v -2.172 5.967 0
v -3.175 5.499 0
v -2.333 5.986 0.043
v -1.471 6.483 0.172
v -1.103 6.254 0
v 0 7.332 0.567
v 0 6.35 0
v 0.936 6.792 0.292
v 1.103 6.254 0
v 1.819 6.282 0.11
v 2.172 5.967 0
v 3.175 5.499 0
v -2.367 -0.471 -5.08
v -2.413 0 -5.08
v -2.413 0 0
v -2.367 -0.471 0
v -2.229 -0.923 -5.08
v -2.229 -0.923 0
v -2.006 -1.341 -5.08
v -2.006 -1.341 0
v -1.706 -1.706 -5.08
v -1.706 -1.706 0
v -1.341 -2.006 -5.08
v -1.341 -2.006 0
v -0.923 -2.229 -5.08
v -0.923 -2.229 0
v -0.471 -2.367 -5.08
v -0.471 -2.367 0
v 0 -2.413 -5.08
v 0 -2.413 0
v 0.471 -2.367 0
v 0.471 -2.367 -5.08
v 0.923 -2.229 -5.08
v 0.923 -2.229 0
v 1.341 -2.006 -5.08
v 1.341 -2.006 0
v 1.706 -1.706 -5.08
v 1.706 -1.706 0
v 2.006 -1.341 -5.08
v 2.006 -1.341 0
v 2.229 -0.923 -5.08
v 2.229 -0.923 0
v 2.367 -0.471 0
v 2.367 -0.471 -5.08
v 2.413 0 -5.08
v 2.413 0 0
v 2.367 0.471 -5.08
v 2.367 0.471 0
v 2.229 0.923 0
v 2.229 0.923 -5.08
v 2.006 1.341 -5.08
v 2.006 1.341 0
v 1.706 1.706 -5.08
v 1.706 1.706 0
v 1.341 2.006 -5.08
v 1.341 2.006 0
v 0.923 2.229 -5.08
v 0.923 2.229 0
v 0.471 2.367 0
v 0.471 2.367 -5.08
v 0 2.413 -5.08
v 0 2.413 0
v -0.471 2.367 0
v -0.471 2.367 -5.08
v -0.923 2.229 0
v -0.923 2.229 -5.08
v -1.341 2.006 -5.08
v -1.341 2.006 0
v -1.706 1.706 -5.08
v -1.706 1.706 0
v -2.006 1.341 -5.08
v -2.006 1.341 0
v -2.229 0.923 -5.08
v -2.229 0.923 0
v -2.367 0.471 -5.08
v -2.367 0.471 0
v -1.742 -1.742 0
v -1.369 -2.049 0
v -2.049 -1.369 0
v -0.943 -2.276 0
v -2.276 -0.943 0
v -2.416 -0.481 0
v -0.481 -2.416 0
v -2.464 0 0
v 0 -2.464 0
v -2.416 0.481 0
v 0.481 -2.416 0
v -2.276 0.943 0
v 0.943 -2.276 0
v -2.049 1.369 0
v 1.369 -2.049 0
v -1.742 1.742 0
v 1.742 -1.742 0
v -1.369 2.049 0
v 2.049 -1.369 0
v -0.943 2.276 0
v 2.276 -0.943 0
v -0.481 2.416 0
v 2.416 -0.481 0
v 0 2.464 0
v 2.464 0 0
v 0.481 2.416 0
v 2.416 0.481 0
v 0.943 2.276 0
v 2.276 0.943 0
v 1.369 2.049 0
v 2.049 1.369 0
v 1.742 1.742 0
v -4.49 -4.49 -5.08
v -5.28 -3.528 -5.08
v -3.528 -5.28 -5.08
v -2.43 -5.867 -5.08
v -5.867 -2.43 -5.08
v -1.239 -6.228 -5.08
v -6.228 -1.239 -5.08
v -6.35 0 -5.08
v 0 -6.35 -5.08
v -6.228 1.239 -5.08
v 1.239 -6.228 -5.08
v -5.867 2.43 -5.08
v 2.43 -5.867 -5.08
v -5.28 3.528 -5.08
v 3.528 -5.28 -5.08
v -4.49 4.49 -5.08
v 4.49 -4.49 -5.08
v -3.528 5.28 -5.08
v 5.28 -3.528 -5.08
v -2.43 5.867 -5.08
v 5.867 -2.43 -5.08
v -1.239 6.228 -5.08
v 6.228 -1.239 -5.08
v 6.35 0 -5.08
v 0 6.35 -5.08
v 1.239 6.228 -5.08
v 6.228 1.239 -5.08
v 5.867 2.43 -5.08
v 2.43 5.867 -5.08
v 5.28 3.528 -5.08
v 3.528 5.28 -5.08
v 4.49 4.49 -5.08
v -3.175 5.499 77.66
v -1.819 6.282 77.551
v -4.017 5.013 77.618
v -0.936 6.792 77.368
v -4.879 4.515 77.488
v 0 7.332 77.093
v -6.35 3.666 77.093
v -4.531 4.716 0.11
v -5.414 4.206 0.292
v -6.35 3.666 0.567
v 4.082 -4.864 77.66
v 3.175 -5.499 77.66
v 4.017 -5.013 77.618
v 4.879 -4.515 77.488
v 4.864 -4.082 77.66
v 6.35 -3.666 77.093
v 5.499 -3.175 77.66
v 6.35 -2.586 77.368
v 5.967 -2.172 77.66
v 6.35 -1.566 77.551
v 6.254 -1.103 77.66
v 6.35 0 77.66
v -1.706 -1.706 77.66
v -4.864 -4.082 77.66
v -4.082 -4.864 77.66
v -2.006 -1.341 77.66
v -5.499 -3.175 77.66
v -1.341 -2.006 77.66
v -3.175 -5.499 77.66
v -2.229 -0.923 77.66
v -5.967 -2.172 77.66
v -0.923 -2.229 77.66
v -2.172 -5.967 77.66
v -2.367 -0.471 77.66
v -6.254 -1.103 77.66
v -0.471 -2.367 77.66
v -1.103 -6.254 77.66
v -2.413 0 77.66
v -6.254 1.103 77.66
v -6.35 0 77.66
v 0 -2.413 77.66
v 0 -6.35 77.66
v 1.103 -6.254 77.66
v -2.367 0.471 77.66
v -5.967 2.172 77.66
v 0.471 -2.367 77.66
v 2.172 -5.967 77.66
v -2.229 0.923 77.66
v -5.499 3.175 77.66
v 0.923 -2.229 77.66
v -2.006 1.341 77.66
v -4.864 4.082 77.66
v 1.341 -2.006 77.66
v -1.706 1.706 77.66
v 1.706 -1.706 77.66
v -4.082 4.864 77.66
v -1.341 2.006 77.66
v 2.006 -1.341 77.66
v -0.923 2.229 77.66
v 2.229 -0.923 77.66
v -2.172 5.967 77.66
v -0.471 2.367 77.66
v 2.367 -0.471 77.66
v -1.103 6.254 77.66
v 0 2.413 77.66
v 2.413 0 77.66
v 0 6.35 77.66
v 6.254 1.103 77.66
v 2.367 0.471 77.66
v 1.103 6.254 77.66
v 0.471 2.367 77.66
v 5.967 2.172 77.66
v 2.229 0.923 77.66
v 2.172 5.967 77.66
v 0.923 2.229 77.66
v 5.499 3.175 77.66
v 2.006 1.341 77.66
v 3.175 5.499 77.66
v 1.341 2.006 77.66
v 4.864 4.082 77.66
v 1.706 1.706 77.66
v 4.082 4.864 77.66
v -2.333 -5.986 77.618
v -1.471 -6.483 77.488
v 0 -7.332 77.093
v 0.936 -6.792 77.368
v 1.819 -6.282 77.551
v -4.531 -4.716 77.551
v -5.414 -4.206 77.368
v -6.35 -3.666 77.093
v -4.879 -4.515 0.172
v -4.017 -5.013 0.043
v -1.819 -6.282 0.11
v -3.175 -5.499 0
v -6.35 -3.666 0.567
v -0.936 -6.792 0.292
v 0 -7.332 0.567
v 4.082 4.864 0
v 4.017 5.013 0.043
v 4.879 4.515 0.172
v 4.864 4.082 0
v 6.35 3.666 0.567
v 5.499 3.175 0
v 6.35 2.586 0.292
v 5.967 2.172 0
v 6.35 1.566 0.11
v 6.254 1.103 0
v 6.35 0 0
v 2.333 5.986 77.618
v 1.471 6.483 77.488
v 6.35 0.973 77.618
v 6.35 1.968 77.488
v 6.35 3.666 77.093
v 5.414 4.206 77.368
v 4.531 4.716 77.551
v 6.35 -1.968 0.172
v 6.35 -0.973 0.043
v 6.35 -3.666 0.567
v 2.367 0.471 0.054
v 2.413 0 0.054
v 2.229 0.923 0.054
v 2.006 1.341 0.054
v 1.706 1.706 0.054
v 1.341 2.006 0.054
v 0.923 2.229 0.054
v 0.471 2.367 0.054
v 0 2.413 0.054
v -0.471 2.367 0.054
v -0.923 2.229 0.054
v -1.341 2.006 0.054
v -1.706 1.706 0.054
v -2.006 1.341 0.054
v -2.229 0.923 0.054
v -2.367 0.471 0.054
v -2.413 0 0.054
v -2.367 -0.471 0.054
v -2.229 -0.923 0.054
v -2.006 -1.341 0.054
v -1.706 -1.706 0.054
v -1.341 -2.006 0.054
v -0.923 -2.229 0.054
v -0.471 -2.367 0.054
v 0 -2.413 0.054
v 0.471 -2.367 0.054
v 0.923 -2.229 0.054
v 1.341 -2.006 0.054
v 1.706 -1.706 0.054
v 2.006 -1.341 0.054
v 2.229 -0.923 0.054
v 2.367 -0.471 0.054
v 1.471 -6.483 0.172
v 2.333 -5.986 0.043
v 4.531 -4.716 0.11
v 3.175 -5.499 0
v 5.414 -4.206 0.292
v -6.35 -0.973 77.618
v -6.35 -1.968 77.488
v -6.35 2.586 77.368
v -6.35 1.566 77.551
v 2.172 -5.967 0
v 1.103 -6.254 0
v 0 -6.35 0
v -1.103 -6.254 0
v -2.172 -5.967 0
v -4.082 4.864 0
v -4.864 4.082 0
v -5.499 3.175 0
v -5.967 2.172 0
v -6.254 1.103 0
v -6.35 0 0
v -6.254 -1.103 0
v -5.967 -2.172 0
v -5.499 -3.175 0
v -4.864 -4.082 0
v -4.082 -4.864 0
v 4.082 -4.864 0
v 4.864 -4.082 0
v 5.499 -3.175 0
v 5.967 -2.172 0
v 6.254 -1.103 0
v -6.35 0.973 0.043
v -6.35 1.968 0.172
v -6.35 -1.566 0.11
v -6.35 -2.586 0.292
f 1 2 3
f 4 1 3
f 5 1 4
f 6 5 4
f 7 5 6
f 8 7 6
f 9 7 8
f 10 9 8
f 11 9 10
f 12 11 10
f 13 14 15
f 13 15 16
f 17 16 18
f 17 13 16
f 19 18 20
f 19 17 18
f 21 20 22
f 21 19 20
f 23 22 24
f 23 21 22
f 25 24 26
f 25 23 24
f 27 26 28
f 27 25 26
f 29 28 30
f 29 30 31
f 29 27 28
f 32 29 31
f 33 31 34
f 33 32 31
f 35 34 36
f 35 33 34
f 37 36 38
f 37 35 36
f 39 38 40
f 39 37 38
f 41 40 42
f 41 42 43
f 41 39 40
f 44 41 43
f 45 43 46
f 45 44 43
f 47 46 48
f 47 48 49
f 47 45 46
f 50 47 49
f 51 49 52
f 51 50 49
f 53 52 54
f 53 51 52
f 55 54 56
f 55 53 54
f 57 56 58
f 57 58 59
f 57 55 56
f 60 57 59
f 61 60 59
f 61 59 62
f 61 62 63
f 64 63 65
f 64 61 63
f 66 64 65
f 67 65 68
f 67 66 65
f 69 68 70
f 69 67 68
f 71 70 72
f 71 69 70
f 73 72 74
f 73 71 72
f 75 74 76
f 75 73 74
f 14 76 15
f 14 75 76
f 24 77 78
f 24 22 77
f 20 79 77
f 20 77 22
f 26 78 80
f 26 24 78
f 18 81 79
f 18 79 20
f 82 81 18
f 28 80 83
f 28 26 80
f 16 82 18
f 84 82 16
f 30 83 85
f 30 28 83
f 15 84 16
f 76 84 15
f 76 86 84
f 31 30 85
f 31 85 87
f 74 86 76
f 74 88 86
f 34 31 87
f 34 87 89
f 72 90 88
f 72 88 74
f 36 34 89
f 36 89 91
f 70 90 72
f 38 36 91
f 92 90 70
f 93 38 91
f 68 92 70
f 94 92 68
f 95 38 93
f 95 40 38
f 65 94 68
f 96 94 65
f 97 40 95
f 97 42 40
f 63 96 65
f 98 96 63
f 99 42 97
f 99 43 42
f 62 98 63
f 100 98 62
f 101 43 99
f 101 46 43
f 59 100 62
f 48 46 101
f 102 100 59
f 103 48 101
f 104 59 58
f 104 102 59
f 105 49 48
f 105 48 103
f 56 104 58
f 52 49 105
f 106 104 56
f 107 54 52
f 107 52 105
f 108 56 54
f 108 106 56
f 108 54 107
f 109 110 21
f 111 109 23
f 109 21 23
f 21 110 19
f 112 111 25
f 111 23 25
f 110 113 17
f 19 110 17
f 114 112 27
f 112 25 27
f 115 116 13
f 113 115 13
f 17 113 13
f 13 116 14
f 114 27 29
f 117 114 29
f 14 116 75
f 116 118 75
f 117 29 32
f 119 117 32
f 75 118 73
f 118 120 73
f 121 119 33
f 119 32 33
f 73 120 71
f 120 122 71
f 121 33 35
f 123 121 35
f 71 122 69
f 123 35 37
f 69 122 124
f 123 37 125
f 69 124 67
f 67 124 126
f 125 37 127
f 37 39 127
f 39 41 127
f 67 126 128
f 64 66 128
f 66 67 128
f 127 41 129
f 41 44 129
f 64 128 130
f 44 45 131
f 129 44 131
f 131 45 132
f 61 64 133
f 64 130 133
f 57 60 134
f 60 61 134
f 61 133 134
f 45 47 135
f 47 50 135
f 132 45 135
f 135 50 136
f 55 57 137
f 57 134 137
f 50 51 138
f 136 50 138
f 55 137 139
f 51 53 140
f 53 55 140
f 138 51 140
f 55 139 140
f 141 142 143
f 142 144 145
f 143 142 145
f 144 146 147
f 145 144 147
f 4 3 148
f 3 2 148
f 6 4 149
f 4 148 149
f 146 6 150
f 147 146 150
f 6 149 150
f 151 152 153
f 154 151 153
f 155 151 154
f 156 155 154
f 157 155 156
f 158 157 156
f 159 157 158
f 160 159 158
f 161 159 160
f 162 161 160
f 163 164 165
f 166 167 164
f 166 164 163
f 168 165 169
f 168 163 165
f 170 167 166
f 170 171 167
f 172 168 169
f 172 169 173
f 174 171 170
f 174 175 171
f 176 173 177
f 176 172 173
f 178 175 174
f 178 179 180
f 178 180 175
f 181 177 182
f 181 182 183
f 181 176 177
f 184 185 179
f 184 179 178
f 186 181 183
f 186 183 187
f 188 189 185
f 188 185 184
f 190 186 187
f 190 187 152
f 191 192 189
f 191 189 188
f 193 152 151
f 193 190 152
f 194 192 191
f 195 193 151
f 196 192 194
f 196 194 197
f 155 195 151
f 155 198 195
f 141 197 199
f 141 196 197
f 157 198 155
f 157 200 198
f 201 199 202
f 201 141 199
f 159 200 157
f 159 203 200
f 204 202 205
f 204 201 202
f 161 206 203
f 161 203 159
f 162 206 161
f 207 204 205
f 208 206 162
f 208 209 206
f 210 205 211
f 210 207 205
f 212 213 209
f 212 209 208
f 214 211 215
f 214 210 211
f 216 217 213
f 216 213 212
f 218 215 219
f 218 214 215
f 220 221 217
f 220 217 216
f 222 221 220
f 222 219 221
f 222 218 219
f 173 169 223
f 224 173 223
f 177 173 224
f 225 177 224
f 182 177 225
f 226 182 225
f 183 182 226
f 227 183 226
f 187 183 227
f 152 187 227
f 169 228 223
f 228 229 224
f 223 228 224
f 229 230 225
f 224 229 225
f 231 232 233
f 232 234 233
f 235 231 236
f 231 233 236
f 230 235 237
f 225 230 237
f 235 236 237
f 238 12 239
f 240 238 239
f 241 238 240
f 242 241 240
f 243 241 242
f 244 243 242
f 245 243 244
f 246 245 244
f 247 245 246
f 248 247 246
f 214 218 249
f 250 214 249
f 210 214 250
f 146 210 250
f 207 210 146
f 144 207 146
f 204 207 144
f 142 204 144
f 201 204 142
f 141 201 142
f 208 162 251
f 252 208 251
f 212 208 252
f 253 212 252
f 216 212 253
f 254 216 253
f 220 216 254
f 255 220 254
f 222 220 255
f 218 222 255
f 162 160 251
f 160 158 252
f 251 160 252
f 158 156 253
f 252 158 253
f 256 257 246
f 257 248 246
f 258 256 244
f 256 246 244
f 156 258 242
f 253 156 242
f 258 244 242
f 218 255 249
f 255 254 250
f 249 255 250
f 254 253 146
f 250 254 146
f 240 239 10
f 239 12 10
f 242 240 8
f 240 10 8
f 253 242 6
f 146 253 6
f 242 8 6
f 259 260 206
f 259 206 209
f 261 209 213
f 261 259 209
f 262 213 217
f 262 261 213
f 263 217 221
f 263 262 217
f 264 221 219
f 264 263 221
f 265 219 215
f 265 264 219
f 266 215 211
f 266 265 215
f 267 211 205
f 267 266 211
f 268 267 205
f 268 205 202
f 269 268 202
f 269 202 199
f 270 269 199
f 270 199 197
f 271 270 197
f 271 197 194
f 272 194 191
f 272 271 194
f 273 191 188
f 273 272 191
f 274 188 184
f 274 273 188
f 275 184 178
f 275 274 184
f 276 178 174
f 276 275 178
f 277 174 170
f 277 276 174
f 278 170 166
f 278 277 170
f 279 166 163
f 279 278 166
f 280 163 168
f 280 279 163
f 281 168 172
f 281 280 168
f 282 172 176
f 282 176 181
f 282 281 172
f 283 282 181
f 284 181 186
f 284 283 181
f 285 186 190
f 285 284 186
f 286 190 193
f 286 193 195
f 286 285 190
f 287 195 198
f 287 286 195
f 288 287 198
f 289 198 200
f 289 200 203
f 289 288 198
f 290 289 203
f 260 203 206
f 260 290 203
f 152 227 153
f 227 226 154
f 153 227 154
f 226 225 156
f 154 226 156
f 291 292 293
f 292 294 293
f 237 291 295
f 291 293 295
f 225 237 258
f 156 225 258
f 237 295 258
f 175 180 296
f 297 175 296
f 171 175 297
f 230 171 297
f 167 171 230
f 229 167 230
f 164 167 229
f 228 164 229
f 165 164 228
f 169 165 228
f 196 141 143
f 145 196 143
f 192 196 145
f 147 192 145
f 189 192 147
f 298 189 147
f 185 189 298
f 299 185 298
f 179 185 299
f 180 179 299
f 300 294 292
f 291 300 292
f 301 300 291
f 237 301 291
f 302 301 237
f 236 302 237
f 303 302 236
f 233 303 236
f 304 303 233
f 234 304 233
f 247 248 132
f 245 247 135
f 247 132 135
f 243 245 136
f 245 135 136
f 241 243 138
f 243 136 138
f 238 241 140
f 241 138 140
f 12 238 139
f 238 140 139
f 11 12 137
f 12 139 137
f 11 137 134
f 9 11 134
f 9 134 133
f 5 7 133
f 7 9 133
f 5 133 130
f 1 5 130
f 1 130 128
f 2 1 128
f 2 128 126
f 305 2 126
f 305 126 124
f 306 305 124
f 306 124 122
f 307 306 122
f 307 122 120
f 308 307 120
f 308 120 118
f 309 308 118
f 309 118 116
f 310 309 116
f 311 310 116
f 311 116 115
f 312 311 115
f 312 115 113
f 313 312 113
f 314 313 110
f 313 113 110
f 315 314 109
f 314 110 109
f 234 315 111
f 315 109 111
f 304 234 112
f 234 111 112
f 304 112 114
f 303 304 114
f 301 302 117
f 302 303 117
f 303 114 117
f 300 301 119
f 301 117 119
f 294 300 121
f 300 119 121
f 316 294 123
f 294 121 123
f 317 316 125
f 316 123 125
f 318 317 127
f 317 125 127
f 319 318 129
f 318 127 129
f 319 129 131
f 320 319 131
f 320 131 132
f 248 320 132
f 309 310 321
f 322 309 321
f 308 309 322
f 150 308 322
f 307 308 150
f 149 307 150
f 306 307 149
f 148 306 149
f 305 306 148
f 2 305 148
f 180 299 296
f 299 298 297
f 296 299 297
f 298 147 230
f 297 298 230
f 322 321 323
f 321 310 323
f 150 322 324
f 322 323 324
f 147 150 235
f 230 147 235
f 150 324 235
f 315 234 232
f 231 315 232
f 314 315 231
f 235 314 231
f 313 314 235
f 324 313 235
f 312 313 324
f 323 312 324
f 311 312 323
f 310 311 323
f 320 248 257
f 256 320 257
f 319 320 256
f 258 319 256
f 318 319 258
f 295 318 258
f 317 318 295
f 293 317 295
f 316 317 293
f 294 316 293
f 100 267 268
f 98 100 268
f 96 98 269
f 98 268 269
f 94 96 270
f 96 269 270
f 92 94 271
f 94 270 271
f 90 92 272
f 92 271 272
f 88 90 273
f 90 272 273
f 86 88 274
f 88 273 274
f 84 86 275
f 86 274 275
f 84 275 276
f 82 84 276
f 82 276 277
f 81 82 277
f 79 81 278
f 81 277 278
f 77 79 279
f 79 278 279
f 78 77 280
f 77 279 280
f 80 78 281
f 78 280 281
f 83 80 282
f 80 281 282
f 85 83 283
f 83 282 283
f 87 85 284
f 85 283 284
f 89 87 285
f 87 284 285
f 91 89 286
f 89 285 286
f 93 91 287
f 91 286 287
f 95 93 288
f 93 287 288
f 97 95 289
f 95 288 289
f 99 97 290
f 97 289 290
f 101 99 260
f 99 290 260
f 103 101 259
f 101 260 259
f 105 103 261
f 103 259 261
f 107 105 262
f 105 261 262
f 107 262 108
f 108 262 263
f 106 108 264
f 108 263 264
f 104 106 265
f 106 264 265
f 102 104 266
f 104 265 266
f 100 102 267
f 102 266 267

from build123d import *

# Parameters (mm, degrees)
SKETCH1_R               = 2.413
EXTRUDE1_DEPTH          = 77.6605
SKETCH8_OUTSIDE_W       = 305.288
SKETCH8_OUTSIDE_H       = 307.252
SKETCH8_OUTSIDE_R       = 6.35
EXTRUDE4_DEPTH          = 79.26390671
EXTRUDE4_DRAFT          = -60
MIRROR1_COPY_1_SKETCH_W = 305.288
MIRROR1_COPY_1_SKETCH_H = 307.252
MIRROR1_COPY_1_SKETCH_R = 6.35
MIRROR1_COPY_1_DEPTH    = 79.26390671
MIRROR1_COPY_1_DRAFT    = -60
BOSS_EXTRUDE1_START     = -5.08
SKETCH13_R              = 6.35
SKETCH13_R_2            = 2.413
BOSS_EXTRUDE1_DEPTH     = 5.08


with BuildPart() as part:
    # Sketch1 → Extrude1 (new body)
    with BuildSketch(Plane.XY):
        Polygon((0, 7.332348419), (-6.35, 3.666174209), (-6.35, -3.666174209), (0, -7.332348419), (6.35, -3.666174209), (6.35, 3.666174209), align=None)
        Circle(SKETCH1_R, mode=Mode.SUBTRACT)
    extrude(amount=EXTRUDE1_DEPTH)

    # Extrude3 cone 1 section (through the dimple's axis) → Extrude3 (revolve, cut)
    with BuildSketch(Plane.YZ):
        Polygon((0, 0), (2.4638, 0), (0, 2.642102028), align=None)
    revolve(axis=Axis((0, 0, 0), (0, 0, 1)), mode=Mode.SUBTRACT)


with BuildPart() as extrude4_tool:
    # Sketch8 outside → Extrude4 (with draft: the straight prism first)
    with BuildSketch(Plane(origin=(0, 0, 0), x_dir=(-1, 0, 0), z_dir=(0, 0, -1))):
        Rectangle(SKETCH8_OUTSIDE_W, SKETCH8_OUTSIDE_H)
        Circle(SKETCH8_OUTSIDE_R, mode=Mode.SUBTRACT)
    extrude(amount=-EXTRUDE4_DEPTH)
    # Extrude4: the draft: its side faces are tilted about the plane it starts from
    extrude4_sides = [extrude4_tool.faces().sort_by_distance(p)[0] for p in [
        (0, -153.626, 39.631953355),
        (-152.644, 0, 39.631953355),
        (0, 153.626, 39.631953355),
        (152.644, 0, 39.631953355),
        (6.35, 0, 39.631953355),
    ]]
    draft(extrude4_sides, Plane(origin=(0, 0, 0), x_dir=(-1, 0, 0), z_dir=(0, 0, -1)), EXTRUDE4_DRAFT)


with BuildPart() as part_1:
    add(part.part)

    # Extrude4: cut by extrude4_tool
    add(extrude4_tool.part, mode=Mode.SUBTRACT)


with BuildPart() as mirror1_copy_1_tool:
    # Mirror1 copy 1 sketch → Mirror1 copy 1 (with draft: the straight prism first)
    with BuildSketch(Plane(origin=(0, 0, 77.6605), x_dir=(-1, 0, 0), z_dir=(0, 0, 1))):
        Rectangle(MIRROR1_COPY_1_SKETCH_W, MIRROR1_COPY_1_SKETCH_H)
        Circle(MIRROR1_COPY_1_SKETCH_R, mode=Mode.SUBTRACT)
    extrude(amount=-MIRROR1_COPY_1_DEPTH)
    # Mirror1 copy 1: the draft: its side faces are tilted about the plane it starts from
    mirror1_copy_1_sides = [mirror1_copy_1_tool.faces().sort_by_distance(p)[0] for p in [
        (0, -153.626, 38.028546645),
        (-152.644, 0, 38.028546645),
        (0, 153.626, 38.028546645),
        (152.644, 0, 38.028546645),
        (6.35, 0, 38.028546645),
    ]]
    draft(mirror1_copy_1_sides, Plane(origin=(0, 0, 77.6605), x_dir=(-1, 0, 0), z_dir=(0, 0, 1)), MIRROR1_COPY_1_DRAFT)


with BuildPart() as part_2:
    add(part_1.part)

    # Mirror1 copy 1: cut by mirror1_copy_1_tool
    add(mirror1_copy_1_tool.part, mode=Mode.SUBTRACT)

    # Sketch13 → Boss-Extrude1 (add)
    with BuildSketch(Plane.XY.offset(BOSS_EXTRUDE1_START)):
        Circle(SKETCH13_R)
        with Locations(Location((0, 0, 0), (0, 0, 180))):
            Circle(SKETCH13_R_2, mode=Mode.SUBTRACT)
    extrude(amount=BOSS_EXTRUDE1_DEPTH)


solid = part_2.part
